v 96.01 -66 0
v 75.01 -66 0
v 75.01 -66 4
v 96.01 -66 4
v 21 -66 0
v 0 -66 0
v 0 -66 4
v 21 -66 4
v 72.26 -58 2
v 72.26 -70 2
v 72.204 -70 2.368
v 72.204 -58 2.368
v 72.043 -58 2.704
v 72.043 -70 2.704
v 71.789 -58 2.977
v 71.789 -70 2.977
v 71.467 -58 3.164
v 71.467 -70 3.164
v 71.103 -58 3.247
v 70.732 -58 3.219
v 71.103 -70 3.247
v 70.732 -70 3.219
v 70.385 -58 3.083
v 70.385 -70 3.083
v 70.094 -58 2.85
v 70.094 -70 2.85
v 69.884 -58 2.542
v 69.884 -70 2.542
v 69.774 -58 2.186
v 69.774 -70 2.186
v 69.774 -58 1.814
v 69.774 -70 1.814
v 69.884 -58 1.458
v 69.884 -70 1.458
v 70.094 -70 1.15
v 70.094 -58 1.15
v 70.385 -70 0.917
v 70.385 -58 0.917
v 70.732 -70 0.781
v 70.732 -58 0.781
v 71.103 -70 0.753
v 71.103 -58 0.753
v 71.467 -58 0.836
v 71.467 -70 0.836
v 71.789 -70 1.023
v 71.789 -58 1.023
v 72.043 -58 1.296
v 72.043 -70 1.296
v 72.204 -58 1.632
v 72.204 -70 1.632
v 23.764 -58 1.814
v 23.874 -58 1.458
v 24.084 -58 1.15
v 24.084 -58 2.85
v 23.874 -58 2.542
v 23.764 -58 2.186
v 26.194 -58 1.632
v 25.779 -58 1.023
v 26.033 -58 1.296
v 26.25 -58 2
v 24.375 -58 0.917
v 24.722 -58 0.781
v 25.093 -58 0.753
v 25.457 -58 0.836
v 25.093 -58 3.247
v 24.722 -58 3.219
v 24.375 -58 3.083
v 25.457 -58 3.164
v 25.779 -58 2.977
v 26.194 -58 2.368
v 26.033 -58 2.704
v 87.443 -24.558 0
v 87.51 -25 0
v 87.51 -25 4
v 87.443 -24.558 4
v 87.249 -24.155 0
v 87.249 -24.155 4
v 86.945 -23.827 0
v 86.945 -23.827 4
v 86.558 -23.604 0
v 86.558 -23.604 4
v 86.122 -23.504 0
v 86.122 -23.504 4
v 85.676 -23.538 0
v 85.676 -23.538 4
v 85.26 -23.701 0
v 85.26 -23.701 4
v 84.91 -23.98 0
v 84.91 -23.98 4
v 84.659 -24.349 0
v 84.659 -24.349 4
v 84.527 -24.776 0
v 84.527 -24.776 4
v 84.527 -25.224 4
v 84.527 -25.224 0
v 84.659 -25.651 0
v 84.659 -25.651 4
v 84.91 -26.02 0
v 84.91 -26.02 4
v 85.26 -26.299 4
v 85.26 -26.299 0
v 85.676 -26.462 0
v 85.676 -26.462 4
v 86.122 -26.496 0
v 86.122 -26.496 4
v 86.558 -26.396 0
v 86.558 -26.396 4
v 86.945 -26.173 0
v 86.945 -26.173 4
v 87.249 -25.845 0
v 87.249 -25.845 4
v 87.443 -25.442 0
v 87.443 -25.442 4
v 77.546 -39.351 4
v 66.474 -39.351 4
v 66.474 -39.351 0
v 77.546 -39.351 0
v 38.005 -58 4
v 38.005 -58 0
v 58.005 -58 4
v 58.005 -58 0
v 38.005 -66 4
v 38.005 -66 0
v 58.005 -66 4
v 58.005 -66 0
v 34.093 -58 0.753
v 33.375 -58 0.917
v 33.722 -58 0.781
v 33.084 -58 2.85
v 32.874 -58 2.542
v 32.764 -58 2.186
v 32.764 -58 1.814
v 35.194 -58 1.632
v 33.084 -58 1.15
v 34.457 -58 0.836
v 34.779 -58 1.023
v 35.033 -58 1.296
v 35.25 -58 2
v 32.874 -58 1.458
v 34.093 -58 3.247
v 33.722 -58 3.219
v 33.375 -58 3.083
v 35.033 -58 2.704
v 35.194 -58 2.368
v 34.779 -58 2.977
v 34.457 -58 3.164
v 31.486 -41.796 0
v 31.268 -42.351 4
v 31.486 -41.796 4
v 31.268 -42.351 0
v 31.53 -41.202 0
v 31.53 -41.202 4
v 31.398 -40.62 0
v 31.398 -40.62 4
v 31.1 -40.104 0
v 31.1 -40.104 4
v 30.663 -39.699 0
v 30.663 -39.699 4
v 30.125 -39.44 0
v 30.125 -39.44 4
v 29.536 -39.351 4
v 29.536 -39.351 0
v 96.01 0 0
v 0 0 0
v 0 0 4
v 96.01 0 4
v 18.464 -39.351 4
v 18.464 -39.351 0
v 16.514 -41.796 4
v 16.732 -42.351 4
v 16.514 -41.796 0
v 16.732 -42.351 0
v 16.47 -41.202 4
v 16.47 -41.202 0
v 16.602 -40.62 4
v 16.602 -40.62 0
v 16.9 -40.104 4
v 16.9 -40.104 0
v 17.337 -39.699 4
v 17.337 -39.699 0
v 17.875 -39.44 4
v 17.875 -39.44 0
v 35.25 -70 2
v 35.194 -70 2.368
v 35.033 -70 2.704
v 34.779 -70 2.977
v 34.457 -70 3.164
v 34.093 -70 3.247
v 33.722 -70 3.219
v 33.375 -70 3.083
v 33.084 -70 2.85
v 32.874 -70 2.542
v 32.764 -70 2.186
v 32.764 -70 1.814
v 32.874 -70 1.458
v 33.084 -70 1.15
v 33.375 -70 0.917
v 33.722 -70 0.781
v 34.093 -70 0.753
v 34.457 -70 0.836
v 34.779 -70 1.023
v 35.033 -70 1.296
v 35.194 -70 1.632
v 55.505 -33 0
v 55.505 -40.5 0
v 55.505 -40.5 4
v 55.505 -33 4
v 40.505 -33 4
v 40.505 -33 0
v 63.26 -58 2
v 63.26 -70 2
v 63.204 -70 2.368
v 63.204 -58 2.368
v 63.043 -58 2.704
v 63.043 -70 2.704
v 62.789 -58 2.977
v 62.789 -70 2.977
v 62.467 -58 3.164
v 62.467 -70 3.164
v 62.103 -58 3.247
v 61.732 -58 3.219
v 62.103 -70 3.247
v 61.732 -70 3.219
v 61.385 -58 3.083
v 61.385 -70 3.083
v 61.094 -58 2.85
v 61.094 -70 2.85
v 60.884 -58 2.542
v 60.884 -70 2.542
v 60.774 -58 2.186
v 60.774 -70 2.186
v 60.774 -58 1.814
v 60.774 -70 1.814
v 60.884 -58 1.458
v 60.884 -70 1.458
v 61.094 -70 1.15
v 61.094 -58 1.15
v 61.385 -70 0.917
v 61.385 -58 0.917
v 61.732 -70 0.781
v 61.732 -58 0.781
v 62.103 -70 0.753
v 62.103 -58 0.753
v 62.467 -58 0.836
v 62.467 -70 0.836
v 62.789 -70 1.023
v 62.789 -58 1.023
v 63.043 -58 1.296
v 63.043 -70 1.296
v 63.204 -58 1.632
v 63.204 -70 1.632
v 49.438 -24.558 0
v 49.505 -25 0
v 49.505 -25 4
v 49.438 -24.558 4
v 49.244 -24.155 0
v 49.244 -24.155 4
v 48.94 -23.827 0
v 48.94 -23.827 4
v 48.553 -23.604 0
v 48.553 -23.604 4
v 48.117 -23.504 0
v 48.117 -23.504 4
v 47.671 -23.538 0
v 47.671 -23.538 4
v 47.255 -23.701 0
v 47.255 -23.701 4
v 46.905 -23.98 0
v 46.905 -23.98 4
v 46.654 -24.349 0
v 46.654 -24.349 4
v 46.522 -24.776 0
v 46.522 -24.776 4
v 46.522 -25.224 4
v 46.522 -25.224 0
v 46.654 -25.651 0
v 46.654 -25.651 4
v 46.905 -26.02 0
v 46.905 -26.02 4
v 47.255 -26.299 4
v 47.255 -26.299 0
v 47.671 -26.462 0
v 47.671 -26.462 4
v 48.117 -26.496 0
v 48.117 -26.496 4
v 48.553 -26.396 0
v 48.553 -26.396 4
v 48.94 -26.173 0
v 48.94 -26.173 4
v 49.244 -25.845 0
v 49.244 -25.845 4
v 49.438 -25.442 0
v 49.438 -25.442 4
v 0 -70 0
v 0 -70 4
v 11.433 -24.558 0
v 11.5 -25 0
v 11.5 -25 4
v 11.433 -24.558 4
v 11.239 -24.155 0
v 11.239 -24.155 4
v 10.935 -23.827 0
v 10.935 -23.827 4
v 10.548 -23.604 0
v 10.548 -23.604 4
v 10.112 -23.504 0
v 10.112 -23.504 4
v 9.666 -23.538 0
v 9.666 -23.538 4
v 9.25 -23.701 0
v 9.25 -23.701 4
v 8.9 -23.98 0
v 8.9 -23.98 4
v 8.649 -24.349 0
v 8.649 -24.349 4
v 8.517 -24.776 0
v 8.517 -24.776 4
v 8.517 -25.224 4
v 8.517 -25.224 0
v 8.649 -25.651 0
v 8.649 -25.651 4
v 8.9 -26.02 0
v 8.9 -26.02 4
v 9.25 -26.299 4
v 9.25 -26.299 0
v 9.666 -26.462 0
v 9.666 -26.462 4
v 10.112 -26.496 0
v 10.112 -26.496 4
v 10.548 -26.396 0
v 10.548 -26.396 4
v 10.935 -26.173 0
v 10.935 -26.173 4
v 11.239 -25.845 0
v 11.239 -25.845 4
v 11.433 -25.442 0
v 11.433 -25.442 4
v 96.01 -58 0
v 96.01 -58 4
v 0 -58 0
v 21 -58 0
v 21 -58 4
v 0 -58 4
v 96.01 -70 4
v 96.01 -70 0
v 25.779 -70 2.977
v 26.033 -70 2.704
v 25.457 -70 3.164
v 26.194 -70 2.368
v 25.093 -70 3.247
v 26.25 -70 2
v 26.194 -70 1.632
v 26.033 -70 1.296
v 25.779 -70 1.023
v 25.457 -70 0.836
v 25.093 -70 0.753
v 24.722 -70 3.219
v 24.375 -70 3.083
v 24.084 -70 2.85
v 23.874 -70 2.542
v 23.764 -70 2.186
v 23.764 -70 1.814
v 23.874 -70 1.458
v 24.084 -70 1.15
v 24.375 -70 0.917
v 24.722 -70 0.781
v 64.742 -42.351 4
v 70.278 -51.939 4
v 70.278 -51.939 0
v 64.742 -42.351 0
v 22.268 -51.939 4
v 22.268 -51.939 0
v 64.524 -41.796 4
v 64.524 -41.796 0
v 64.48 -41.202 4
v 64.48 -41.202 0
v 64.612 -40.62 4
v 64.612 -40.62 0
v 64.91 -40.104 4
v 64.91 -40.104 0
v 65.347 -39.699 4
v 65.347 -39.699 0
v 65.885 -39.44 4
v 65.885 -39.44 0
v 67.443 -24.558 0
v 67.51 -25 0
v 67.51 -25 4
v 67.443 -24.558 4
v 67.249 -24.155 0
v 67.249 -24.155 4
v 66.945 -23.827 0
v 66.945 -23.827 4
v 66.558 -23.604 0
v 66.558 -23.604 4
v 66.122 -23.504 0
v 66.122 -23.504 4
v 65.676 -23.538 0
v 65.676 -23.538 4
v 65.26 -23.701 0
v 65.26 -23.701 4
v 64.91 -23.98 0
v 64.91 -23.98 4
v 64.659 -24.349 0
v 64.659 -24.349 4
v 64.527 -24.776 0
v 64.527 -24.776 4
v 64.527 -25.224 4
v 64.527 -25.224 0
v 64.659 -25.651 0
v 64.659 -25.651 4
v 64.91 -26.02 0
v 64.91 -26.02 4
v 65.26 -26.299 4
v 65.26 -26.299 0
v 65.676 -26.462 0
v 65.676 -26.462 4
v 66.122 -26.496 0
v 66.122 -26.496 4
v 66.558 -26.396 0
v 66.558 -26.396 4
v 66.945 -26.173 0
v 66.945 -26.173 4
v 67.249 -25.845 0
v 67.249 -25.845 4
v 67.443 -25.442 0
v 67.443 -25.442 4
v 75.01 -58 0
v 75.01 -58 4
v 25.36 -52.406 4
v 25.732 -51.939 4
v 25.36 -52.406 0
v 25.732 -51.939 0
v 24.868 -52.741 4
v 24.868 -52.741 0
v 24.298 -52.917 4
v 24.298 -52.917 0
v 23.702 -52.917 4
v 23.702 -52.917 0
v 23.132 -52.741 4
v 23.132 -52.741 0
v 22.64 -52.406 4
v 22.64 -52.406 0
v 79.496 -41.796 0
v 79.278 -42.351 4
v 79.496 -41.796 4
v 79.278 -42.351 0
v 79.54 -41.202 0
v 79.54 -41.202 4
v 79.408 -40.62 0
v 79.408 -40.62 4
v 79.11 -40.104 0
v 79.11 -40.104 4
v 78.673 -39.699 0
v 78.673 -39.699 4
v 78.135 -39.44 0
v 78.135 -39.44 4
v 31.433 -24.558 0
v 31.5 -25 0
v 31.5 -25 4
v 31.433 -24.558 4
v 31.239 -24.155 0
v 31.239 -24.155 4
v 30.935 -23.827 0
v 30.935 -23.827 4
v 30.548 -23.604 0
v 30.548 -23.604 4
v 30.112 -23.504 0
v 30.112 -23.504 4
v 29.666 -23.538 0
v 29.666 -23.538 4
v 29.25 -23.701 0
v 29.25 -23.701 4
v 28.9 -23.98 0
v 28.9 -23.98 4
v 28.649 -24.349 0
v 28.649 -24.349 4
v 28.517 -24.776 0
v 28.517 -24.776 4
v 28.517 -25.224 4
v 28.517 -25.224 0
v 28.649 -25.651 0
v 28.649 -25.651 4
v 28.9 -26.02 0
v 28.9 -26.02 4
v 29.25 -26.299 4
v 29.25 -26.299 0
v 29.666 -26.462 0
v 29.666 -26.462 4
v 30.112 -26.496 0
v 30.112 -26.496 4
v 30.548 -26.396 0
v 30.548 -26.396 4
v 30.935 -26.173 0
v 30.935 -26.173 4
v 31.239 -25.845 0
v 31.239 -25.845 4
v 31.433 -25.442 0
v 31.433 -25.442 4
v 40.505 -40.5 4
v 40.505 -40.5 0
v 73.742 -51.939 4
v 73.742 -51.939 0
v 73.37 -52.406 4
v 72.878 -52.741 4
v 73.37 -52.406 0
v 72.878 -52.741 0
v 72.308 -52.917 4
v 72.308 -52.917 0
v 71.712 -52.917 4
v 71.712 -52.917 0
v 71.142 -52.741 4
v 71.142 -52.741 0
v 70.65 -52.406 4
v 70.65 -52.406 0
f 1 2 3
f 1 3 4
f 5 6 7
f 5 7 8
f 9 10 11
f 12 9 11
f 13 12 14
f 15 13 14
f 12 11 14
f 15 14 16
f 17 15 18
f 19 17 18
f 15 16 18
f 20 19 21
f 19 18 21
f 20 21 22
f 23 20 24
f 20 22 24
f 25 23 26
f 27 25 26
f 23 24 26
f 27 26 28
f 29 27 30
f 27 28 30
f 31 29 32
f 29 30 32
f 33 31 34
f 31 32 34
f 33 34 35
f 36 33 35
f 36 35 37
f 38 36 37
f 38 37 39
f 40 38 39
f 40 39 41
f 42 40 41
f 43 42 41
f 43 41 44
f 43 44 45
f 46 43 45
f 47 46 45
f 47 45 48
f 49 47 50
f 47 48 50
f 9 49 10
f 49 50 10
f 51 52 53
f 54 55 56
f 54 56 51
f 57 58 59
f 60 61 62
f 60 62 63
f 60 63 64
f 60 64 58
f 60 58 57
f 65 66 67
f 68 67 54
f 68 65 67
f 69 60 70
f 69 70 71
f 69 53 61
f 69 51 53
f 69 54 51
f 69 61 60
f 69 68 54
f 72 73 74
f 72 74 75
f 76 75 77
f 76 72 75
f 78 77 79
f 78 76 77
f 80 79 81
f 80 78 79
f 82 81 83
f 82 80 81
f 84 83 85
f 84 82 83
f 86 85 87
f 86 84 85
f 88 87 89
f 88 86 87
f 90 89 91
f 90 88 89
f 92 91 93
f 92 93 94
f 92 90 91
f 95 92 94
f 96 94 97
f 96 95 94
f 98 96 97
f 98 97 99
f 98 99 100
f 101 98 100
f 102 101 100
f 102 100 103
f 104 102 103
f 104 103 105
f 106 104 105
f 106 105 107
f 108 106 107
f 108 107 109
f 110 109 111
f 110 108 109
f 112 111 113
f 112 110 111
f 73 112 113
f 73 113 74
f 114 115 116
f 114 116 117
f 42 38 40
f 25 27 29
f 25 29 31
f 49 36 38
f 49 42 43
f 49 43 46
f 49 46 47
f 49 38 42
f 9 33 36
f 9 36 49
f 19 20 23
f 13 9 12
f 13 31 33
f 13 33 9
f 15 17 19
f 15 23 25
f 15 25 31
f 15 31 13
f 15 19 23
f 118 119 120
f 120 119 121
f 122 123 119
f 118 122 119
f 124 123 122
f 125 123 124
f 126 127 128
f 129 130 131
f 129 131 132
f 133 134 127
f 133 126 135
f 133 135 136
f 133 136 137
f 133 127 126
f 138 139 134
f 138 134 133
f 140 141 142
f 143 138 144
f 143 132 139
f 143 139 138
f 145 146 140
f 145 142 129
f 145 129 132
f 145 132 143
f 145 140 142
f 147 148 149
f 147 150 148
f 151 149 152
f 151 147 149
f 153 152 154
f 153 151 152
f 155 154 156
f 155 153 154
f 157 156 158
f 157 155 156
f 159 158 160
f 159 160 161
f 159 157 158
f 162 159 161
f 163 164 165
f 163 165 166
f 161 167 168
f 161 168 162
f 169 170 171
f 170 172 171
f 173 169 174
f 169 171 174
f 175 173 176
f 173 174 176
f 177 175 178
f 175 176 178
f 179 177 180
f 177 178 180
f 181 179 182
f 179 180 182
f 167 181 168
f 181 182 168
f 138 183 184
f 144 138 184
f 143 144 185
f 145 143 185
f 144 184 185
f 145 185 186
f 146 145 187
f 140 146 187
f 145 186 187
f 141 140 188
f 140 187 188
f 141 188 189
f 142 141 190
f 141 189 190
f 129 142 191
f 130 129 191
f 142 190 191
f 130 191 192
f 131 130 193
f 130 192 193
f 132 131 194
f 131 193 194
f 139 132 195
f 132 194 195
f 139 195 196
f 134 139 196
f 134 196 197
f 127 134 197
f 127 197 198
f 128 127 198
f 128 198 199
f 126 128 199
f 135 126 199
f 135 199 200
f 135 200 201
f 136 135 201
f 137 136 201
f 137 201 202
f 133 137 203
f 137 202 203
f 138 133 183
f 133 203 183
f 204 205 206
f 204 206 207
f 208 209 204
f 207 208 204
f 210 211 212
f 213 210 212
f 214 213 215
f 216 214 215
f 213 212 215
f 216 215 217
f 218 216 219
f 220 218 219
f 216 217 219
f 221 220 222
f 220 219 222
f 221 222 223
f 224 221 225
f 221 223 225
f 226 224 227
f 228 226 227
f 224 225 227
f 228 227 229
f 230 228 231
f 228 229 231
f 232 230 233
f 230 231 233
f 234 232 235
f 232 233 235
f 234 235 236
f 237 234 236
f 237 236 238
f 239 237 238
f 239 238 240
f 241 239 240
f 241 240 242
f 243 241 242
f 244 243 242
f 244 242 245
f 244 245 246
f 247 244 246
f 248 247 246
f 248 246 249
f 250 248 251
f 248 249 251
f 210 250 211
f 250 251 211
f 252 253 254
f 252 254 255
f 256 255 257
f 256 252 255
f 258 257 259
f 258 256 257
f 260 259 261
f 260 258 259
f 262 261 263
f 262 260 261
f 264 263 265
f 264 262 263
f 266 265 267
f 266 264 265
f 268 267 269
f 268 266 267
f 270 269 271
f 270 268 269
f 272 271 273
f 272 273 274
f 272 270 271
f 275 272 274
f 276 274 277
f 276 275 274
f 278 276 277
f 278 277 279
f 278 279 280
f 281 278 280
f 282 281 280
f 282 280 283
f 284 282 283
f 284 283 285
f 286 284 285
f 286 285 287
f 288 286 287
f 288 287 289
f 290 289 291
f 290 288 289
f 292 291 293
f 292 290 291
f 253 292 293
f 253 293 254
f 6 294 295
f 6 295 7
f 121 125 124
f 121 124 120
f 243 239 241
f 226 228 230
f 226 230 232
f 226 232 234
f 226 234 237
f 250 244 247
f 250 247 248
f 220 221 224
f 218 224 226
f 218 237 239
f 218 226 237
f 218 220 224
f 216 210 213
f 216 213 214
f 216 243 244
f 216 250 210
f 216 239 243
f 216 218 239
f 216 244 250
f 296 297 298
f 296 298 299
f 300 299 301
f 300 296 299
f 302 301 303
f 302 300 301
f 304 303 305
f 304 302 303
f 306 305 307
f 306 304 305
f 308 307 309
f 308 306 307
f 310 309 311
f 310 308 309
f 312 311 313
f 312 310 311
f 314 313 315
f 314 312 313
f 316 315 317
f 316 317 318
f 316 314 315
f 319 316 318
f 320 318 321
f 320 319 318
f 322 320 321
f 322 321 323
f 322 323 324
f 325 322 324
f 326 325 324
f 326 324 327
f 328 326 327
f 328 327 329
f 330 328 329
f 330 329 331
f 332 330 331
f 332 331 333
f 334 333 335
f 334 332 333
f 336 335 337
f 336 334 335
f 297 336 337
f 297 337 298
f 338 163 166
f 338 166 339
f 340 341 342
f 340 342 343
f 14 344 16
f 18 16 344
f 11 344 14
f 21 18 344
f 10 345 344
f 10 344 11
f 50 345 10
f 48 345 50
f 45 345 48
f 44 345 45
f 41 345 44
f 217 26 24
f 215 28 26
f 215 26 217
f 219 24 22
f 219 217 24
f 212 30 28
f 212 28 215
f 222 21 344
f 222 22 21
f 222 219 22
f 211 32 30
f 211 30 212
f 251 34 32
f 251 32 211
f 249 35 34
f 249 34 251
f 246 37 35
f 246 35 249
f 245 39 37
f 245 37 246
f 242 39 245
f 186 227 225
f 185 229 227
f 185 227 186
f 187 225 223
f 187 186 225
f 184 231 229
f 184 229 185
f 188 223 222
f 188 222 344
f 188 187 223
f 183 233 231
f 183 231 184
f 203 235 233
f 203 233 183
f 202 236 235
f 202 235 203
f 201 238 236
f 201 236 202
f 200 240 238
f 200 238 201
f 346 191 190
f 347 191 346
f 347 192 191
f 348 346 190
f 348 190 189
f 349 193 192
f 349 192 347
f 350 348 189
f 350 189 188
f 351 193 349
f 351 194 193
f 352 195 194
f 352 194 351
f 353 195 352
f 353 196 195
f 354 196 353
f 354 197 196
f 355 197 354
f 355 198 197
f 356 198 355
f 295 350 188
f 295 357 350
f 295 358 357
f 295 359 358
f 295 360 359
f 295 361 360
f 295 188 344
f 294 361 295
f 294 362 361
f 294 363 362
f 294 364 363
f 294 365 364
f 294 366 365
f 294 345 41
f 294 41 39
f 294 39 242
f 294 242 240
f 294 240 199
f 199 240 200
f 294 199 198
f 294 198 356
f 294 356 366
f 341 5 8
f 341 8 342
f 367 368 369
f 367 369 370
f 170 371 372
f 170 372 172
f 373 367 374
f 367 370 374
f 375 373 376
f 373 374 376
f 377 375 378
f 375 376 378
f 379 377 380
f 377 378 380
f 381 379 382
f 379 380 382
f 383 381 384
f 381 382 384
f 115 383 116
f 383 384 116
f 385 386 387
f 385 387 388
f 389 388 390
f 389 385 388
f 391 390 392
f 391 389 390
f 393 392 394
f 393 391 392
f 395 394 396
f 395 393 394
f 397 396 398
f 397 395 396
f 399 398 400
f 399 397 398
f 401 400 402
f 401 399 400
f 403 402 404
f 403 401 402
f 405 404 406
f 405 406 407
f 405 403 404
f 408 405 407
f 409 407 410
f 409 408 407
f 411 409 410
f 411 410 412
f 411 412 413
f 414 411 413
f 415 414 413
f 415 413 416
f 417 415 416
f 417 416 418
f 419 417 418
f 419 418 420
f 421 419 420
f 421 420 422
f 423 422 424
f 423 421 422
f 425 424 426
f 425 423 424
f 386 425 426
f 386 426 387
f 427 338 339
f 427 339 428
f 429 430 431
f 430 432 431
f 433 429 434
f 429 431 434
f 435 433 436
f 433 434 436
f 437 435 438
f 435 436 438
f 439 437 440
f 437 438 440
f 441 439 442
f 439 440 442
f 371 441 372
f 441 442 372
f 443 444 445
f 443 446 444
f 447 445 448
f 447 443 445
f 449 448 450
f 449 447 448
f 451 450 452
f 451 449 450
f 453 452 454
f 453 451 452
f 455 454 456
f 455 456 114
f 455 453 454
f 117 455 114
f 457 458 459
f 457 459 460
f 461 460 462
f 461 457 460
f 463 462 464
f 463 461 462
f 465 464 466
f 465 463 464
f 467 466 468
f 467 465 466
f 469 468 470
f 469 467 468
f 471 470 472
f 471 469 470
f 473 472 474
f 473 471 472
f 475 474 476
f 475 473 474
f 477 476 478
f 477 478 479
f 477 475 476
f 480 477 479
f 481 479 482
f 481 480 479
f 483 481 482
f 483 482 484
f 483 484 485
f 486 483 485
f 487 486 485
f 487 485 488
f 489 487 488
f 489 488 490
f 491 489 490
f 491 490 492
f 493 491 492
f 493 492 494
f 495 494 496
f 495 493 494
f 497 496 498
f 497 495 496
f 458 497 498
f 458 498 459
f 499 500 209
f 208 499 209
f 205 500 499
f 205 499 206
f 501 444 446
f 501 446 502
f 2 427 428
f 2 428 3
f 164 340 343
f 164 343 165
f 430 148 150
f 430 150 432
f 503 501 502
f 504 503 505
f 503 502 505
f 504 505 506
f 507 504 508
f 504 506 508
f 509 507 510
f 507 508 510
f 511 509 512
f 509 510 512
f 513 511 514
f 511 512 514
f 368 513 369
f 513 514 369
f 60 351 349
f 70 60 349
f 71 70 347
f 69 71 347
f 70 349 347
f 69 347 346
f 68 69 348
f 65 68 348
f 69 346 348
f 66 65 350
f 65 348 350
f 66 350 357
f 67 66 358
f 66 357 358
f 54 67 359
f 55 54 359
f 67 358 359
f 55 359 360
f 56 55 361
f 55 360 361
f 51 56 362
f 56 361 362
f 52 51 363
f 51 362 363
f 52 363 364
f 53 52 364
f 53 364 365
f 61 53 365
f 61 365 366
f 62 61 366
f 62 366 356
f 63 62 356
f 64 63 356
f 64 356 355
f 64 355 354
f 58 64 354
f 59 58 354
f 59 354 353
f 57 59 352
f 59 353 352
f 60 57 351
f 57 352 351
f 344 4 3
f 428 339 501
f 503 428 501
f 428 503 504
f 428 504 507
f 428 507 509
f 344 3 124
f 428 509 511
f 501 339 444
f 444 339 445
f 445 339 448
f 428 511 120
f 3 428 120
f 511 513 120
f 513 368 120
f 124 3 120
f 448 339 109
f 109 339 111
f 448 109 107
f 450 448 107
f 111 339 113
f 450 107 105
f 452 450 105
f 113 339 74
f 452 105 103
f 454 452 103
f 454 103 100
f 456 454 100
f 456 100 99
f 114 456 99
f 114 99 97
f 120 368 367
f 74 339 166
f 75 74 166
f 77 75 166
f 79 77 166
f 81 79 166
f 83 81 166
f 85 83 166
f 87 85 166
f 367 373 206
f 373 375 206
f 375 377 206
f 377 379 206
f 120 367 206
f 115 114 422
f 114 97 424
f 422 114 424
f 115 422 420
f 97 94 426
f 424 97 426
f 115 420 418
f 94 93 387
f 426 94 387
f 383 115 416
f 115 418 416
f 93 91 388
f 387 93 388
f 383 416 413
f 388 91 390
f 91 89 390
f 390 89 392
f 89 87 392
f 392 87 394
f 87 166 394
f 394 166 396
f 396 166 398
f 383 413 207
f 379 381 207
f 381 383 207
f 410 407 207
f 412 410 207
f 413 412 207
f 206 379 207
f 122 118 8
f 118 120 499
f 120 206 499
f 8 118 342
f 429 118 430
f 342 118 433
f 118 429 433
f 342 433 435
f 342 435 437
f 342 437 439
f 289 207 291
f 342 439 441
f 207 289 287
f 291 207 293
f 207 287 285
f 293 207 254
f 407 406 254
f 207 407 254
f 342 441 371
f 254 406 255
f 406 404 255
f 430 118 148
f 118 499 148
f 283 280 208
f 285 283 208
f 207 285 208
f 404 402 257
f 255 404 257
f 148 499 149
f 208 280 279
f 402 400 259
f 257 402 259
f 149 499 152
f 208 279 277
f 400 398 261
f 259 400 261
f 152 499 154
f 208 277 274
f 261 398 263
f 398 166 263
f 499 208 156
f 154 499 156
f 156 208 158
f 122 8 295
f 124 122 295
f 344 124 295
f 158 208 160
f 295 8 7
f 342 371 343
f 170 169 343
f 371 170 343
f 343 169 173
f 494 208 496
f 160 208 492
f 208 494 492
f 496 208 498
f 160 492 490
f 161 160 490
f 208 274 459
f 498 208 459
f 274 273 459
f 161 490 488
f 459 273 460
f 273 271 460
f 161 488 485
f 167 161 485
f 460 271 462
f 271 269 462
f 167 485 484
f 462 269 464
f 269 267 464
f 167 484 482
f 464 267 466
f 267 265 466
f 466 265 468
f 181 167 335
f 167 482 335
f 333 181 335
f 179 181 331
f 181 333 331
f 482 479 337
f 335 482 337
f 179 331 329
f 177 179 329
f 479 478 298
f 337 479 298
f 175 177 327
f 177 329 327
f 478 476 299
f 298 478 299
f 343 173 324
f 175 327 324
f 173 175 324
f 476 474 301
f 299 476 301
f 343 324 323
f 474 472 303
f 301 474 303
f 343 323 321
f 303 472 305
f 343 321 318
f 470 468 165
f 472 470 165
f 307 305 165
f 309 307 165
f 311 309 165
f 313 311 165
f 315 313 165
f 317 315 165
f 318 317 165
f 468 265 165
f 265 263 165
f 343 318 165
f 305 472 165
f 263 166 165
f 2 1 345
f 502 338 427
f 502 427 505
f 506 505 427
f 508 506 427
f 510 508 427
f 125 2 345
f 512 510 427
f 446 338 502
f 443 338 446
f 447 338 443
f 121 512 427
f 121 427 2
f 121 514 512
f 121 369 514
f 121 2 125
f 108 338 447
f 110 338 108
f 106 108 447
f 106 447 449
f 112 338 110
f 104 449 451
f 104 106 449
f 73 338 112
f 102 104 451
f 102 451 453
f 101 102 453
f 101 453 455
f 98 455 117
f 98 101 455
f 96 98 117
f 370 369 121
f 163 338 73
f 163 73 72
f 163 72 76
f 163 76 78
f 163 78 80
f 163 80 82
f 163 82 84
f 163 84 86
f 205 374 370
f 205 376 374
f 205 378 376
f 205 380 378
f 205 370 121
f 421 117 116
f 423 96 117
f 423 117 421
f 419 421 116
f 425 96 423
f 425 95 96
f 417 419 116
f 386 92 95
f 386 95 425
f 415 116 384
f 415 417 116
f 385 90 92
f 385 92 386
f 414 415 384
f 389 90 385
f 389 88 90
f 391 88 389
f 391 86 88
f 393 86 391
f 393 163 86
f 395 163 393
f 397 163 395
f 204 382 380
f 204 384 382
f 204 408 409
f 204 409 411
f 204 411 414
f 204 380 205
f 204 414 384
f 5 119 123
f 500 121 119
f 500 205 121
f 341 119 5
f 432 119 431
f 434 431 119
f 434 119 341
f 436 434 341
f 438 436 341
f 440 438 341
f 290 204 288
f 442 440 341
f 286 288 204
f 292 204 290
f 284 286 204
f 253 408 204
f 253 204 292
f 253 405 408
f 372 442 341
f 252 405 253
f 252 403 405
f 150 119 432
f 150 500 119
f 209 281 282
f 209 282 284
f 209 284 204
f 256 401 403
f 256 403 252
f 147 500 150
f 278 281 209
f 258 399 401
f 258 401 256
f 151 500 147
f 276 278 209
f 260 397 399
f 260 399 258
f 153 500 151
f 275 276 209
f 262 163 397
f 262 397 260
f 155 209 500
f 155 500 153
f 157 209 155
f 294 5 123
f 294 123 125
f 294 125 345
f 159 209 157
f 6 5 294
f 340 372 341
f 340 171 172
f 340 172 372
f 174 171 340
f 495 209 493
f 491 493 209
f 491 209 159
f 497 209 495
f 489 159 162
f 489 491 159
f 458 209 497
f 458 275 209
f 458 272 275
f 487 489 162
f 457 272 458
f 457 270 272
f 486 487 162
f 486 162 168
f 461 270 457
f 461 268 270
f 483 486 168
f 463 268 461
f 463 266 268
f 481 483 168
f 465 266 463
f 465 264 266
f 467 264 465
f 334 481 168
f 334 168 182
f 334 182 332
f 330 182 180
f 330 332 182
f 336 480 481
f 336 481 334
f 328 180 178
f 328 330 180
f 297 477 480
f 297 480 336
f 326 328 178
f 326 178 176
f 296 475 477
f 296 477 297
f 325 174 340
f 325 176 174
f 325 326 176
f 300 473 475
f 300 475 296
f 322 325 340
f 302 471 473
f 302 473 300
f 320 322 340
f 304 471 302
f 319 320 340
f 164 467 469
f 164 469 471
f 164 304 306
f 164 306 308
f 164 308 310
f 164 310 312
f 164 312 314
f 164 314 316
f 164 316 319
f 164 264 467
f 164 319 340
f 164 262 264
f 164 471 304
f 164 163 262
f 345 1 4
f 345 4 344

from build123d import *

# Parameters (mm, degrees)
ESBO_O1_R                = 1.5
ESBO_O1_W                = 20
ESBO_O1_H                = 8
ESBO_O1_W_2              = 15
ESBO_O1_H_2              = 7.5
RESSALTO_EXTRUS_O1_DEPTH = 4
CORTE_EXTRUS_O1_DEPTH    = 10
FILETE1_R                = 2
ESBO_O3_R                = 1.25
CORTE_EXTRUS_O2_DEPTH    = 12


with BuildPart() as part:
    # Esboço1 → Ressalto-extrusão1 (new body)
    with BuildSketch(Plane.XY):
        Polygon((0, 0), (96.01, 0), (96.01, -58), (75.01, -58), (75.01, -66), (96.01, -66), (96.01, -70), (0, -70), (0, -66), (21, -66), (21, -58), (0, -58), align=None)
        with Locations((48.005, -25)):
            Circle(ESBO_O1_R, mode=Mode.SUBTRACT)
        with Locations((86.01, -25)):
            Circle(ESBO_O1_R, mode=Mode.SUBTRACT)
        with Locations((10, -25)):
            Circle(ESBO_O1_R, mode=Mode.SUBTRACT)
        with Locations((66.01, -25)):
            Circle(ESBO_O1_R, mode=Mode.SUBTRACT)
        with Locations((30, -25)):
            Circle(ESBO_O1_R, mode=Mode.SUBTRACT)
        with Locations((48.005, -62)):
            Rectangle(ESBO_O1_W, ESBO_O1_H, mode=Mode.SUBTRACT)
        with Locations((48.005, -36.75)):
            Rectangle(ESBO_O1_W_2, ESBO_O1_H_2, mode=Mode.SUBTRACT)
    extrude(amount=RESSALTO_EXTRUS_O1_DEPTH)

    # Esboço2 → Corte-extrusão1 (cut)
    with BuildSketch(Plane.XY.offset(4)):
        Polygon((63.01, -39.351037912), (81.01, -39.351037912), (72.01, -54.93949518), align=None)
        Polygon((15, -39.351037912), (33, -39.351037912), (24, -54.93949518), align=None)
    extrude(amount=-CORTE_EXTRUS_O1_DEPTH, mode=Mode.SUBTRACT)

    # Filete1
    filete1_edges = [part.edges().sort_by_distance(p)[0] for p in [
        (72.01, -54.93949518, 2),
        (63.01, -39.351037912, 2),
        (81.01, -39.351037912, 2),
        (24, -54.93949518, 2),
        (15, -39.351037912, 2),
        (33, -39.351037912, 2),
    ]]
    fillet(filete1_edges, radius=FILETE1_R)

    # Esboço3 → Corte-extrusão2 (cut)
    with BuildSketch(Plane.XZ.offset(70)):
        with Locations((25, 2)):
            Circle(ESBO_O3_R)
        with Locations((34, 2)):
            Circle(ESBO_O3_R)
        with Locations((62.01, 2)):
            Circle(ESBO_O3_R)
        with Locations((71.01, 2)):
            Circle(ESBO_O3_R)
    extrude(amount=-CORTE_EXTRUS_O2_DEPTH, mode=Mode.SUBTRACT)


solid = part.part
